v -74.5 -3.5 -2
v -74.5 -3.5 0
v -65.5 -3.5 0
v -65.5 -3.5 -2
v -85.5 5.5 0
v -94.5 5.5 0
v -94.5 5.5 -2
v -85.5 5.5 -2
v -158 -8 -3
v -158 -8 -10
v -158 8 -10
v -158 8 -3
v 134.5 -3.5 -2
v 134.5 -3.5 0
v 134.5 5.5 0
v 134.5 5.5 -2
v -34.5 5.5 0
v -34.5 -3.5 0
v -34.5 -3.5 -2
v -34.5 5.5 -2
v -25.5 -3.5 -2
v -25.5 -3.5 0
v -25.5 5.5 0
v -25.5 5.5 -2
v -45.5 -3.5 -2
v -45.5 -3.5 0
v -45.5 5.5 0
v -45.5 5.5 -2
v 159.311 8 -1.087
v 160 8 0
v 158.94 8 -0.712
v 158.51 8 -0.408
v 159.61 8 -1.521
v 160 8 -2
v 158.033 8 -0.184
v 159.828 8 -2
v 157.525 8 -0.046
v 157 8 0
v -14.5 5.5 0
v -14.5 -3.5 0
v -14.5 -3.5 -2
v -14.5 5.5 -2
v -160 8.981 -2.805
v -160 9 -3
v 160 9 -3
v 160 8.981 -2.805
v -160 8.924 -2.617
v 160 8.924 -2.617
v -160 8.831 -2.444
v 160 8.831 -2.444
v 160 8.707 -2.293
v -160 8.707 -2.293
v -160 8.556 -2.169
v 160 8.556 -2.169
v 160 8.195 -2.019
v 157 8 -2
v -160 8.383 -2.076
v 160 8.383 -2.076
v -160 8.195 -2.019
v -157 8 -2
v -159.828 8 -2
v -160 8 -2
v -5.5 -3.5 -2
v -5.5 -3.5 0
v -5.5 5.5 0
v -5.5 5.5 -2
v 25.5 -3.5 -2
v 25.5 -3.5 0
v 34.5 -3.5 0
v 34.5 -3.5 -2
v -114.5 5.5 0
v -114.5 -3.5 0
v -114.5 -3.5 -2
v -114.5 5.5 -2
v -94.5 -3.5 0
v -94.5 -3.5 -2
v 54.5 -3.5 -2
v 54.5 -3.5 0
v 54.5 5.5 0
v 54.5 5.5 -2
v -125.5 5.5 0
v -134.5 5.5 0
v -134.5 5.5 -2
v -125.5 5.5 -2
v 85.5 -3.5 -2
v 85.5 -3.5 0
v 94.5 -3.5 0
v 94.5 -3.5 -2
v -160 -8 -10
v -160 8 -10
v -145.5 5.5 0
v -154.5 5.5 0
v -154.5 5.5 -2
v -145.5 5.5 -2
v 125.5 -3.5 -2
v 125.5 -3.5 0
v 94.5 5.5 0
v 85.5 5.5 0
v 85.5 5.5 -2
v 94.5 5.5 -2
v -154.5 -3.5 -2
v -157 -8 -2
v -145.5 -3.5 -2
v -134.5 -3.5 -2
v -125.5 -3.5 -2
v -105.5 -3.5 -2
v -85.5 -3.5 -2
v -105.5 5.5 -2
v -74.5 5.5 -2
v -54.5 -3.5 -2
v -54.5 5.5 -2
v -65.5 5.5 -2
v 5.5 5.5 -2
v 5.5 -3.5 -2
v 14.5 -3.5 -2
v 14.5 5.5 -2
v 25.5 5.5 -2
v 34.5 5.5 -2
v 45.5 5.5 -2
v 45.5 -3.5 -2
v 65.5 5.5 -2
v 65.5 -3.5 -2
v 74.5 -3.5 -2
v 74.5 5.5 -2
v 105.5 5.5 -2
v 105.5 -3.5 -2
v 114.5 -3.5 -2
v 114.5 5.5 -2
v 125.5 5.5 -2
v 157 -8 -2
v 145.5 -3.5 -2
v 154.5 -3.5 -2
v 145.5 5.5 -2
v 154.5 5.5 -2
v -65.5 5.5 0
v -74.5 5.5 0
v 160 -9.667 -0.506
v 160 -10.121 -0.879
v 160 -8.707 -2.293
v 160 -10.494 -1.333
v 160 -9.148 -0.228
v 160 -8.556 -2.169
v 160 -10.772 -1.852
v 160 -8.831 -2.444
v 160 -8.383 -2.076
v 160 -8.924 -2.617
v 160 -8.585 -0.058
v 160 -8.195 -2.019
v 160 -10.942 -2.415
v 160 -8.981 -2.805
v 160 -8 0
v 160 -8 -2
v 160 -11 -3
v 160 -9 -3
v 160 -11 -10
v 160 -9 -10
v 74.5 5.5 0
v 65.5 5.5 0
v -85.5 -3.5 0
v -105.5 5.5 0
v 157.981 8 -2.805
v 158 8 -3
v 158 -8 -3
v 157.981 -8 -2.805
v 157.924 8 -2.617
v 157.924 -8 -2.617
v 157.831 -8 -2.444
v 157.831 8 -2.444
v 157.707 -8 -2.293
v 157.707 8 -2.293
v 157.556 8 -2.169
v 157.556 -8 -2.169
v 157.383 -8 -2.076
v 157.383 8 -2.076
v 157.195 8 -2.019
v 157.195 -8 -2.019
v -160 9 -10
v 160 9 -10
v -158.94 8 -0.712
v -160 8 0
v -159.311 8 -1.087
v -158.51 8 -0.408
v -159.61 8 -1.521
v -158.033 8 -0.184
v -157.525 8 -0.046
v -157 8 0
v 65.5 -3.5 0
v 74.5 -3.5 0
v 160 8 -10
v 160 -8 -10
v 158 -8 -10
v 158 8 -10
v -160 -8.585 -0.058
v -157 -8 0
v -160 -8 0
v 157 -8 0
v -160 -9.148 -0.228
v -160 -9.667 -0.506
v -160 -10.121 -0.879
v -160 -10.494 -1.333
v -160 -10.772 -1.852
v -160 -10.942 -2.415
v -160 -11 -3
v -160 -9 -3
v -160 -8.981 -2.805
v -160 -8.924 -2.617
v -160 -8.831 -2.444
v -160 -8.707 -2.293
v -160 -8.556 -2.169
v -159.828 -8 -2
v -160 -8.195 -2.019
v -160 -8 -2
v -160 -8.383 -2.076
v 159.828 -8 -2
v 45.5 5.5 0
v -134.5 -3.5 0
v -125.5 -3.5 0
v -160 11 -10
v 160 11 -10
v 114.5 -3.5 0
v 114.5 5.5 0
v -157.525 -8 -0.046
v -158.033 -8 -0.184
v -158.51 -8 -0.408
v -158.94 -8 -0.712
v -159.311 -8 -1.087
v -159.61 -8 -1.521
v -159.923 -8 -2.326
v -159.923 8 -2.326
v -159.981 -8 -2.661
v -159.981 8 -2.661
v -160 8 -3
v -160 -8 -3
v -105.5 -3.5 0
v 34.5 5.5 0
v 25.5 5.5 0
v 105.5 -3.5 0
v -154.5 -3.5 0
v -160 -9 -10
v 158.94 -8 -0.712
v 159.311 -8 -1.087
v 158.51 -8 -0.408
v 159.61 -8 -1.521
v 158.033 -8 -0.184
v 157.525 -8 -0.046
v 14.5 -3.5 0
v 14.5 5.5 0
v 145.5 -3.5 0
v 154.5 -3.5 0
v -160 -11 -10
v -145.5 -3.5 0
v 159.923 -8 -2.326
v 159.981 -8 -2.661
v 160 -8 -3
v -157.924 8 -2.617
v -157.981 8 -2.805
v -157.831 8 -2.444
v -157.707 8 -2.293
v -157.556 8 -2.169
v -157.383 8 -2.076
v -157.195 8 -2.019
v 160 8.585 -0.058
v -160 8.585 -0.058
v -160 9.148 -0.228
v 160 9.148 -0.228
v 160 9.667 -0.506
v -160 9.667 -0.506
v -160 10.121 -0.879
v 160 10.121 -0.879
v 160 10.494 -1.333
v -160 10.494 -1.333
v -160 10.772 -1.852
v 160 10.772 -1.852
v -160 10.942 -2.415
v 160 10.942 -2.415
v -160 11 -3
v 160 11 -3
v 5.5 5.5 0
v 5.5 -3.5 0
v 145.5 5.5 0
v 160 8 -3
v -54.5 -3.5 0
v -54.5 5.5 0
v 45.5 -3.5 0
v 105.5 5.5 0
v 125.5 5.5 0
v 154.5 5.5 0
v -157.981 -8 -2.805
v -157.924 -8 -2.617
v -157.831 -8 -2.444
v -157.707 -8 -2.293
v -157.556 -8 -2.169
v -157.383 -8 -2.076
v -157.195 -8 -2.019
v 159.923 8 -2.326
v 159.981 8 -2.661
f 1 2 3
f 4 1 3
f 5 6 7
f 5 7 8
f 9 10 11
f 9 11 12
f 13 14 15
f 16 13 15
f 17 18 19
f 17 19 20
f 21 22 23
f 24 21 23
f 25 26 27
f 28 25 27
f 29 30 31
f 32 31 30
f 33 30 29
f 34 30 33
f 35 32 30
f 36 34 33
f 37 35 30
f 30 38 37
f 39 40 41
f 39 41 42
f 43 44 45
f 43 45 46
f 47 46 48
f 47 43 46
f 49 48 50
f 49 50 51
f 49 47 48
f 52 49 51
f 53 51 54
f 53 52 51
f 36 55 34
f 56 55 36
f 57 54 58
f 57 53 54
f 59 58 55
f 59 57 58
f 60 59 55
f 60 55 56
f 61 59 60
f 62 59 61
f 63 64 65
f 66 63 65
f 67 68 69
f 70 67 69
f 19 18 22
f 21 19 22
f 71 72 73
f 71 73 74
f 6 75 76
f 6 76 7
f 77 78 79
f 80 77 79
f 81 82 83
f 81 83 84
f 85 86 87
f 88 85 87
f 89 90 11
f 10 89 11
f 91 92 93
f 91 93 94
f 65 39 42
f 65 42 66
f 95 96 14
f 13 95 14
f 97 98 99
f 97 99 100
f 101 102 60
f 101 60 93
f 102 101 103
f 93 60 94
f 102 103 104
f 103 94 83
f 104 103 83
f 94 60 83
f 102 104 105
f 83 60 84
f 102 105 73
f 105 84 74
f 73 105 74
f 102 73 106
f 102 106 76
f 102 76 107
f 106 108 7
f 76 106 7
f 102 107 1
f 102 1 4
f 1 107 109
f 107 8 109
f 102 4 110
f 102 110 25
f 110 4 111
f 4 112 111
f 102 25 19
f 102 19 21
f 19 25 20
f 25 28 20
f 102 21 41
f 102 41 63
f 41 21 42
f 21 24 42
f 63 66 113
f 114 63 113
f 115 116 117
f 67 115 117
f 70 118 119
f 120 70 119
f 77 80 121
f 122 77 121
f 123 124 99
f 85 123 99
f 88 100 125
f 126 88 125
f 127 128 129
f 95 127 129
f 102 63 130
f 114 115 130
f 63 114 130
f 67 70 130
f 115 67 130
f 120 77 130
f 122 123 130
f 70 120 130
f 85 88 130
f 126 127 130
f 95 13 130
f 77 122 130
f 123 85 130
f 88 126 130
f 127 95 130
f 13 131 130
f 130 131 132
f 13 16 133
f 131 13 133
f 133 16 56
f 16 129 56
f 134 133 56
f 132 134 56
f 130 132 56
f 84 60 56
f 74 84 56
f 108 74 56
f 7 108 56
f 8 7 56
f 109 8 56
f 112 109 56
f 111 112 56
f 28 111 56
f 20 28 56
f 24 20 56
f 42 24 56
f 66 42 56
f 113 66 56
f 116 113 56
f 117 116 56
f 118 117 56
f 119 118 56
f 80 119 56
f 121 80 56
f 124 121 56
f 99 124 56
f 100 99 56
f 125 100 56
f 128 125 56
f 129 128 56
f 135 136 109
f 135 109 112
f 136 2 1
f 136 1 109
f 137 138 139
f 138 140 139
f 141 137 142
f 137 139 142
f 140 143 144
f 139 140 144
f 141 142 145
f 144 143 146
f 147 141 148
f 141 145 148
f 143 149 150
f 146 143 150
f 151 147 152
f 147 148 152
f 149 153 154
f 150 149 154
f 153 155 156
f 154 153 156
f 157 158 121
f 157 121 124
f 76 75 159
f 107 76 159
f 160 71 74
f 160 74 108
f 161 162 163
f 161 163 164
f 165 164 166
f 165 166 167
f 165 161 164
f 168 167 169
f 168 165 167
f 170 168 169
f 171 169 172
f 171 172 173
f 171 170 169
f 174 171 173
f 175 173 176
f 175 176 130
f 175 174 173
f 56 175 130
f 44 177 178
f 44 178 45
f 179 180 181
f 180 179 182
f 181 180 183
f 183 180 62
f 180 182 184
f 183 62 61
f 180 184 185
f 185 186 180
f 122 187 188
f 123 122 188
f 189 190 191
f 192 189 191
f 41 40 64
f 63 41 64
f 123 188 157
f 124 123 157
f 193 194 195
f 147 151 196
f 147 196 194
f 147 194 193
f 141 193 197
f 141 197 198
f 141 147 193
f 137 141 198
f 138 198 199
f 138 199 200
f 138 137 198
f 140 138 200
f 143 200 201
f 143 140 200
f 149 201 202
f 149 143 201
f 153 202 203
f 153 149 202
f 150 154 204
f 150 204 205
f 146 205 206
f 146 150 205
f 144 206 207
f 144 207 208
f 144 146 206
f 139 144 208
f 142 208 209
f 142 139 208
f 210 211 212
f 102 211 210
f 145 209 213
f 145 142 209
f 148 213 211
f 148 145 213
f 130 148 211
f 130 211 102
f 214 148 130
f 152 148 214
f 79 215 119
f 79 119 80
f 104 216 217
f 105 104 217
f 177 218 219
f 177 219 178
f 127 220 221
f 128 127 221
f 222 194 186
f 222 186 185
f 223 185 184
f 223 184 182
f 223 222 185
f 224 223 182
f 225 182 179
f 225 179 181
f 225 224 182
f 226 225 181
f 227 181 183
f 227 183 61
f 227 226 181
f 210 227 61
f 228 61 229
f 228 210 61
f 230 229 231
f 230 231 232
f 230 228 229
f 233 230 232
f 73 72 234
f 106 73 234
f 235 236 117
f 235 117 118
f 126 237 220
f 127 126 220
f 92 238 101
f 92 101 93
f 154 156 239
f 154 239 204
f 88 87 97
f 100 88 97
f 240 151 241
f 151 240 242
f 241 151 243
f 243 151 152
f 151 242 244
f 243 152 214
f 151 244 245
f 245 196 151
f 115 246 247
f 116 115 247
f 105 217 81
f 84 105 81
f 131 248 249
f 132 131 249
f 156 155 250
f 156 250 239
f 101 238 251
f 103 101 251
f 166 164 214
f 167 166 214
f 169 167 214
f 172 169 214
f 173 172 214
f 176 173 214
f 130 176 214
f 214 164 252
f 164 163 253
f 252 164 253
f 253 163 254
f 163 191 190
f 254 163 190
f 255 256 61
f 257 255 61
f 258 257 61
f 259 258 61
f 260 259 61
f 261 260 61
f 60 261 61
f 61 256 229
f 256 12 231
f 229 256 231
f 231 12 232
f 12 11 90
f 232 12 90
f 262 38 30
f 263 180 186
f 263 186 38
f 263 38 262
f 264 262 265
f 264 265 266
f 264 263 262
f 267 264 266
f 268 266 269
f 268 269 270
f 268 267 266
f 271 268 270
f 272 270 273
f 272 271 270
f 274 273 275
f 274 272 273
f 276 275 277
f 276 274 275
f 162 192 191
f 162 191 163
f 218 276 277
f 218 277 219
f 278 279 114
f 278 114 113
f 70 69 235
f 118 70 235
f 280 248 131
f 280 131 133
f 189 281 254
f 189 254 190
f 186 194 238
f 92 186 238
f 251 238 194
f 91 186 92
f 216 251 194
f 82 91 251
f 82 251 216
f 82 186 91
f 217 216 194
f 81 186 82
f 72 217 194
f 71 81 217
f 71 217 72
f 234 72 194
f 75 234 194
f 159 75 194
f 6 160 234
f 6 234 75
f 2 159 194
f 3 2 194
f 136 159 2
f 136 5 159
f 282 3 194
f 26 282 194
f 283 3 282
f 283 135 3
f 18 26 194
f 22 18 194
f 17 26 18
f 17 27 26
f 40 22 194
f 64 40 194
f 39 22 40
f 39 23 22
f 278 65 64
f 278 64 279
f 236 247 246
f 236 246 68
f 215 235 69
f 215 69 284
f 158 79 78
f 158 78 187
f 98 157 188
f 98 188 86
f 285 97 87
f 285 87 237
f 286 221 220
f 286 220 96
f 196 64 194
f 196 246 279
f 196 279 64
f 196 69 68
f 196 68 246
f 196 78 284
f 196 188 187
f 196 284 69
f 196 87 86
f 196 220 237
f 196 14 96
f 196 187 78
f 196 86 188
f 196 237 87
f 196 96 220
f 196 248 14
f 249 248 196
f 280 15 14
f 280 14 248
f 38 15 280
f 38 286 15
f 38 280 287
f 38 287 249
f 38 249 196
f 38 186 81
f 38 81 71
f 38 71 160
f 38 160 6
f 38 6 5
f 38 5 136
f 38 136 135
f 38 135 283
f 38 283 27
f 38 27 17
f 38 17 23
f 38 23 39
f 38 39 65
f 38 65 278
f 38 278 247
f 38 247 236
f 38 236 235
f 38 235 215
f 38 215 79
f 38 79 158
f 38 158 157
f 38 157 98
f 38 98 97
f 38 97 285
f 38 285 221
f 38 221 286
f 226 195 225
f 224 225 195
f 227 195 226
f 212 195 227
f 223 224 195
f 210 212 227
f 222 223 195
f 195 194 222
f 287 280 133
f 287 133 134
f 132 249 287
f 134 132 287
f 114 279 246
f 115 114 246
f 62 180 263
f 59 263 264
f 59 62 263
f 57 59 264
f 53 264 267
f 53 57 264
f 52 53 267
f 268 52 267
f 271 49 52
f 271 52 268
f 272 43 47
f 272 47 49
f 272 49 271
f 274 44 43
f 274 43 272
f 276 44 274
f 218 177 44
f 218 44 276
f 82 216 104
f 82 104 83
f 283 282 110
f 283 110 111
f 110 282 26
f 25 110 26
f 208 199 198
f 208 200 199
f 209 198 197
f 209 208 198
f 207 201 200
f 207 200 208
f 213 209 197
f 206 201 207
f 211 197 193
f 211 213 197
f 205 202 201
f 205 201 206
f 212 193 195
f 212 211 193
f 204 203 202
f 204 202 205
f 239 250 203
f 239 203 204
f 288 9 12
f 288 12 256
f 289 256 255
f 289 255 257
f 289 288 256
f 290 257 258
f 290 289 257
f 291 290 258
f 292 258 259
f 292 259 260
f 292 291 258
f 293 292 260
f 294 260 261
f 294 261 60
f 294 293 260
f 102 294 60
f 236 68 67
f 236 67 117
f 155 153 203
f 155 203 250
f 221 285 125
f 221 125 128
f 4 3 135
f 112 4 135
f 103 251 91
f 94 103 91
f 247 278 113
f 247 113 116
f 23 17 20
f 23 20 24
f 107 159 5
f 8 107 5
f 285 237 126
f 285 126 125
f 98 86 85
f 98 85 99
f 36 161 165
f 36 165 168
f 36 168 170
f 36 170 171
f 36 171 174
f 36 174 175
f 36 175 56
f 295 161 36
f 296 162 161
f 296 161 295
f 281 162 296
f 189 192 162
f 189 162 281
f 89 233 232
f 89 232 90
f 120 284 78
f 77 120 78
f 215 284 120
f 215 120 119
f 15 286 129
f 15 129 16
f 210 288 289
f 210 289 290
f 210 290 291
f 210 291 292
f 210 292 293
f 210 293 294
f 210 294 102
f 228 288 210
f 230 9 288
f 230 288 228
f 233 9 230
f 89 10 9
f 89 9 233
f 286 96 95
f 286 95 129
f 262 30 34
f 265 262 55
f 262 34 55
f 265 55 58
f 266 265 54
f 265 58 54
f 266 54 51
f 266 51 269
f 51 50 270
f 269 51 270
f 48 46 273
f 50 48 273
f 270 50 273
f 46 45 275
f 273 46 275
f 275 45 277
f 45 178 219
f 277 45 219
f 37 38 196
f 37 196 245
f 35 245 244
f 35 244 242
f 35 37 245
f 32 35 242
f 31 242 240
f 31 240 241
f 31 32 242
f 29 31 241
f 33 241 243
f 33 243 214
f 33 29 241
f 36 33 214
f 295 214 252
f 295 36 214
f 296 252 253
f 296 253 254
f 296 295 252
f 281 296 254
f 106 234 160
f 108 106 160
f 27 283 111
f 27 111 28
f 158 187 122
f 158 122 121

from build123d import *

# Parameters (mm, degrees)
SKETCH_1_W                         = 320
SKETCH_1_H                         = 22
SM_BASE_FLANGE_1_DEPTH             = 2
SM_EDGE_FLANGE_1_STRIP_W           = 10
SM_EDGE_FLANGE_1_STRIP_H           = 2
SM_EDGE_FLANGE_1_STRIP_CUT_DEPTH   = 320
SM_EDGE_FLANGE_1_STRIP_2_W         = 10
SM_EDGE_FLANGE_1_STRIP_2_H         = 2
SM_EDGE_FLANGE_1_STRIP_CUT_2_DEPTH = 320
SM_EDGE_FLANGE_1_DEPTH             = 320
SM_EDGE_FLANGE_1_BEND_DEPTH        = 320
SM_EDGE_FLANGE_2_STRIP_W           = 10
SM_EDGE_FLANGE_2_STRIP_H           = 2
SM_EDGE_FLANGE_2_STRIP_CUT_DEPTH   = 16
SM_EDGE_FLANGE_2_STRIP_2_W         = 10
SM_EDGE_FLANGE_2_STRIP_2_H         = 2
SM_EDGE_FLANGE_2_STRIP_CUT_2_DEPTH = 16
SM_EDGE_FLANGE_2_DEPTH             = 16
SM_EDGE_FLANGE_2_BEND_DEPTH        = 16
SKETCH_18_W                        = 9
SKETCH_18_H                        = 9
CUT_EXTRUDE_1_DEPTH                = 10
PATTERN_LINEAR_1_COUNT             = 20
PATTERN_LINEAR_1_PITCH             = 20


# Sheet-metal steps are written as plain solids
with BuildPart() as part:
    # Sketch 1 → 基体-法兰1 (new body)
    with BuildSketch(Plane.XY):
        Rectangle(SKETCH_1_W, SKETCH_1_H)
    extrude(amount=-SM_BASE_FLANGE_1_DEPTH)

    # 边线-法兰1 strip (across the edge) → 边线-法兰1 strip cut (cut)
    with BuildSketch(Plane(origin=(160, -11, -2), x_dir=(0, 1, 0), z_dir=(-1, 0, 0))):
        with Locations((-2, -1)):
            Rectangle(SM_EDGE_FLANGE_1_STRIP_W, SM_EDGE_FLANGE_1_STRIP_H)
    extrude(amount=SM_EDGE_FLANGE_1_STRIP_CUT_DEPTH, mode=Mode.SUBTRACT)

    # 边线-法兰1 strip 2 (across the edge) → 边线-法兰1 strip cut 2 (cut)
    with BuildSketch(Plane(origin=(-160, 11, -2), x_dir=(0, -1, 0), z_dir=(1, 0, 0))):
        with Locations((-2, -1)):
            Rectangle(SM_EDGE_FLANGE_1_STRIP_2_W, SM_EDGE_FLANGE_1_STRIP_2_H)
    extrude(amount=SM_EDGE_FLANGE_1_STRIP_CUT_2_DEPTH, mode=Mode.SUBTRACT)

    # 边线-法兰1 section (across the edge) → 边线-法兰1 (add)
    with BuildSketch(Plane(origin=(160, -11, -2), x_dir=(0, 1, 0), z_dir=(-1, 0, 0))):
        with BuildLine():
            Line((0, 1), (0, 8))
            Line((0, 8), (2, 8))
            Line((2, 8), (2, 1))
            ThreePointArc((2, 1), (2.292893219, 0.292893219), (3, 0))
            Line((3, 0), (3, -2))
            ThreePointArc((3, -2), (0.878679656, -1.121320344), (0, 1))
        make_face()
    extrude(amount=SM_EDGE_FLANGE_1_DEPTH)

    # 边线-法兰1 section 2 (across the edge) → 边线-法兰1 bend (add)
    with BuildSketch(Plane(origin=(-160, 11, -2), x_dir=(0, -1, 0), z_dir=(1, 0, 0))):
        with BuildLine():
            Line((0, 1), (0, 8))
            Line((0, 8), (2, 8))
            Line((2, 8), (2, 1))
            ThreePointArc((2, 1), (2.292893219, 0.292893219), (3, 0))
            Line((3, 0), (3, -2))
            ThreePointArc((3, -2), (0.878679656, -1.121320344), (0, 1))
        make_face()
    extrude(amount=SM_EDGE_FLANGE_1_BEND_DEPTH)

    # 边线-法兰2 strip (across the edge) → 边线-法兰2 strip cut (cut)
    with BuildSketch(Plane(origin=(-160, -8, -2), x_dir=(1, 0, 0), z_dir=(0, 1, 0))):
        with Locations((-2, -1)):
            Rectangle(SM_EDGE_FLANGE_2_STRIP_W, SM_EDGE_FLANGE_2_STRIP_H)
    extrude(amount=SM_EDGE_FLANGE_2_STRIP_CUT_DEPTH, mode=Mode.SUBTRACT)

    # 边线-法兰2 strip 2 (across the edge) → 边线-法兰2 strip cut 2 (cut)
    with BuildSketch(Plane(origin=(160, 8, -2), x_dir=(-1, 0, 0), z_dir=(0, -1, 0))):
        with Locations((-2, -1)):
            Rectangle(SM_EDGE_FLANGE_2_STRIP_2_W, SM_EDGE_FLANGE_2_STRIP_2_H)
    extrude(amount=SM_EDGE_FLANGE_2_STRIP_CUT_2_DEPTH, mode=Mode.SUBTRACT)

    # 边线-法兰2 section (across the edge) → 边线-法兰2 (add)
    with BuildSketch(Plane(origin=(-160, -8, -2), x_dir=(1, 0, 0), z_dir=(0, 1, 0))):
        with BuildLine():
            Line((0, 1), (0, 8))
            Line((0, 8), (2, 8))
            Line((2, 8), (2, 1))
            ThreePointArc((2, 1), (2.292893219, 0.292893219), (3, 0))
            Line((3, 0), (3, -2))
            ThreePointArc((3, -2), (0.878679656, -1.121320344), (0, 1))
        make_face()
    extrude(amount=SM_EDGE_FLANGE_2_DEPTH)

    # 边线-法兰2 section 2 (across the edge) → 边线-法兰2 bend (add)
    with BuildSketch(Plane(origin=(160, 8, -2), x_dir=(-1, 0, 0), z_dir=(0, -1, 0))):
        with BuildLine():
            Line((0, 1), (0, 8))
            Line((0, 8), (2, 8))
            Line((2, 8), (2, 1))
            ThreePointArc((2, 1), (2.292893219, 0.292893219), (3, 0))
            Line((3, 0), (3, -2))
            ThreePointArc((3, -2), (0.878679656, -1.121320344), (0, 1))
        make_face()
    extrude(amount=SM_EDGE_FLANGE_2_BEND_DEPTH)

    # 草图18 → 切除-拉伸1 (cut)
    with BuildSketch(Plane.XY):
        with Locations((-150, 1)):
            Rectangle(SKETCH_18_W, SKETCH_18_H)
    cut_extrude_1 = extrude(amount=-CUT_EXTRUDE_1_DEPTH, mode=Mode.SUBTRACT)

    # 阵列(线性)1: 切除-拉伸1 ×20
    with Locations(*[(i * PATTERN_LINEAR_1_PITCH, 0, 0) for i in range(1, PATTERN_LINEAR_1_COUNT)]):
        add(cut_extrude_1, mode=Mode.SUBTRACT)


solid = part.part
